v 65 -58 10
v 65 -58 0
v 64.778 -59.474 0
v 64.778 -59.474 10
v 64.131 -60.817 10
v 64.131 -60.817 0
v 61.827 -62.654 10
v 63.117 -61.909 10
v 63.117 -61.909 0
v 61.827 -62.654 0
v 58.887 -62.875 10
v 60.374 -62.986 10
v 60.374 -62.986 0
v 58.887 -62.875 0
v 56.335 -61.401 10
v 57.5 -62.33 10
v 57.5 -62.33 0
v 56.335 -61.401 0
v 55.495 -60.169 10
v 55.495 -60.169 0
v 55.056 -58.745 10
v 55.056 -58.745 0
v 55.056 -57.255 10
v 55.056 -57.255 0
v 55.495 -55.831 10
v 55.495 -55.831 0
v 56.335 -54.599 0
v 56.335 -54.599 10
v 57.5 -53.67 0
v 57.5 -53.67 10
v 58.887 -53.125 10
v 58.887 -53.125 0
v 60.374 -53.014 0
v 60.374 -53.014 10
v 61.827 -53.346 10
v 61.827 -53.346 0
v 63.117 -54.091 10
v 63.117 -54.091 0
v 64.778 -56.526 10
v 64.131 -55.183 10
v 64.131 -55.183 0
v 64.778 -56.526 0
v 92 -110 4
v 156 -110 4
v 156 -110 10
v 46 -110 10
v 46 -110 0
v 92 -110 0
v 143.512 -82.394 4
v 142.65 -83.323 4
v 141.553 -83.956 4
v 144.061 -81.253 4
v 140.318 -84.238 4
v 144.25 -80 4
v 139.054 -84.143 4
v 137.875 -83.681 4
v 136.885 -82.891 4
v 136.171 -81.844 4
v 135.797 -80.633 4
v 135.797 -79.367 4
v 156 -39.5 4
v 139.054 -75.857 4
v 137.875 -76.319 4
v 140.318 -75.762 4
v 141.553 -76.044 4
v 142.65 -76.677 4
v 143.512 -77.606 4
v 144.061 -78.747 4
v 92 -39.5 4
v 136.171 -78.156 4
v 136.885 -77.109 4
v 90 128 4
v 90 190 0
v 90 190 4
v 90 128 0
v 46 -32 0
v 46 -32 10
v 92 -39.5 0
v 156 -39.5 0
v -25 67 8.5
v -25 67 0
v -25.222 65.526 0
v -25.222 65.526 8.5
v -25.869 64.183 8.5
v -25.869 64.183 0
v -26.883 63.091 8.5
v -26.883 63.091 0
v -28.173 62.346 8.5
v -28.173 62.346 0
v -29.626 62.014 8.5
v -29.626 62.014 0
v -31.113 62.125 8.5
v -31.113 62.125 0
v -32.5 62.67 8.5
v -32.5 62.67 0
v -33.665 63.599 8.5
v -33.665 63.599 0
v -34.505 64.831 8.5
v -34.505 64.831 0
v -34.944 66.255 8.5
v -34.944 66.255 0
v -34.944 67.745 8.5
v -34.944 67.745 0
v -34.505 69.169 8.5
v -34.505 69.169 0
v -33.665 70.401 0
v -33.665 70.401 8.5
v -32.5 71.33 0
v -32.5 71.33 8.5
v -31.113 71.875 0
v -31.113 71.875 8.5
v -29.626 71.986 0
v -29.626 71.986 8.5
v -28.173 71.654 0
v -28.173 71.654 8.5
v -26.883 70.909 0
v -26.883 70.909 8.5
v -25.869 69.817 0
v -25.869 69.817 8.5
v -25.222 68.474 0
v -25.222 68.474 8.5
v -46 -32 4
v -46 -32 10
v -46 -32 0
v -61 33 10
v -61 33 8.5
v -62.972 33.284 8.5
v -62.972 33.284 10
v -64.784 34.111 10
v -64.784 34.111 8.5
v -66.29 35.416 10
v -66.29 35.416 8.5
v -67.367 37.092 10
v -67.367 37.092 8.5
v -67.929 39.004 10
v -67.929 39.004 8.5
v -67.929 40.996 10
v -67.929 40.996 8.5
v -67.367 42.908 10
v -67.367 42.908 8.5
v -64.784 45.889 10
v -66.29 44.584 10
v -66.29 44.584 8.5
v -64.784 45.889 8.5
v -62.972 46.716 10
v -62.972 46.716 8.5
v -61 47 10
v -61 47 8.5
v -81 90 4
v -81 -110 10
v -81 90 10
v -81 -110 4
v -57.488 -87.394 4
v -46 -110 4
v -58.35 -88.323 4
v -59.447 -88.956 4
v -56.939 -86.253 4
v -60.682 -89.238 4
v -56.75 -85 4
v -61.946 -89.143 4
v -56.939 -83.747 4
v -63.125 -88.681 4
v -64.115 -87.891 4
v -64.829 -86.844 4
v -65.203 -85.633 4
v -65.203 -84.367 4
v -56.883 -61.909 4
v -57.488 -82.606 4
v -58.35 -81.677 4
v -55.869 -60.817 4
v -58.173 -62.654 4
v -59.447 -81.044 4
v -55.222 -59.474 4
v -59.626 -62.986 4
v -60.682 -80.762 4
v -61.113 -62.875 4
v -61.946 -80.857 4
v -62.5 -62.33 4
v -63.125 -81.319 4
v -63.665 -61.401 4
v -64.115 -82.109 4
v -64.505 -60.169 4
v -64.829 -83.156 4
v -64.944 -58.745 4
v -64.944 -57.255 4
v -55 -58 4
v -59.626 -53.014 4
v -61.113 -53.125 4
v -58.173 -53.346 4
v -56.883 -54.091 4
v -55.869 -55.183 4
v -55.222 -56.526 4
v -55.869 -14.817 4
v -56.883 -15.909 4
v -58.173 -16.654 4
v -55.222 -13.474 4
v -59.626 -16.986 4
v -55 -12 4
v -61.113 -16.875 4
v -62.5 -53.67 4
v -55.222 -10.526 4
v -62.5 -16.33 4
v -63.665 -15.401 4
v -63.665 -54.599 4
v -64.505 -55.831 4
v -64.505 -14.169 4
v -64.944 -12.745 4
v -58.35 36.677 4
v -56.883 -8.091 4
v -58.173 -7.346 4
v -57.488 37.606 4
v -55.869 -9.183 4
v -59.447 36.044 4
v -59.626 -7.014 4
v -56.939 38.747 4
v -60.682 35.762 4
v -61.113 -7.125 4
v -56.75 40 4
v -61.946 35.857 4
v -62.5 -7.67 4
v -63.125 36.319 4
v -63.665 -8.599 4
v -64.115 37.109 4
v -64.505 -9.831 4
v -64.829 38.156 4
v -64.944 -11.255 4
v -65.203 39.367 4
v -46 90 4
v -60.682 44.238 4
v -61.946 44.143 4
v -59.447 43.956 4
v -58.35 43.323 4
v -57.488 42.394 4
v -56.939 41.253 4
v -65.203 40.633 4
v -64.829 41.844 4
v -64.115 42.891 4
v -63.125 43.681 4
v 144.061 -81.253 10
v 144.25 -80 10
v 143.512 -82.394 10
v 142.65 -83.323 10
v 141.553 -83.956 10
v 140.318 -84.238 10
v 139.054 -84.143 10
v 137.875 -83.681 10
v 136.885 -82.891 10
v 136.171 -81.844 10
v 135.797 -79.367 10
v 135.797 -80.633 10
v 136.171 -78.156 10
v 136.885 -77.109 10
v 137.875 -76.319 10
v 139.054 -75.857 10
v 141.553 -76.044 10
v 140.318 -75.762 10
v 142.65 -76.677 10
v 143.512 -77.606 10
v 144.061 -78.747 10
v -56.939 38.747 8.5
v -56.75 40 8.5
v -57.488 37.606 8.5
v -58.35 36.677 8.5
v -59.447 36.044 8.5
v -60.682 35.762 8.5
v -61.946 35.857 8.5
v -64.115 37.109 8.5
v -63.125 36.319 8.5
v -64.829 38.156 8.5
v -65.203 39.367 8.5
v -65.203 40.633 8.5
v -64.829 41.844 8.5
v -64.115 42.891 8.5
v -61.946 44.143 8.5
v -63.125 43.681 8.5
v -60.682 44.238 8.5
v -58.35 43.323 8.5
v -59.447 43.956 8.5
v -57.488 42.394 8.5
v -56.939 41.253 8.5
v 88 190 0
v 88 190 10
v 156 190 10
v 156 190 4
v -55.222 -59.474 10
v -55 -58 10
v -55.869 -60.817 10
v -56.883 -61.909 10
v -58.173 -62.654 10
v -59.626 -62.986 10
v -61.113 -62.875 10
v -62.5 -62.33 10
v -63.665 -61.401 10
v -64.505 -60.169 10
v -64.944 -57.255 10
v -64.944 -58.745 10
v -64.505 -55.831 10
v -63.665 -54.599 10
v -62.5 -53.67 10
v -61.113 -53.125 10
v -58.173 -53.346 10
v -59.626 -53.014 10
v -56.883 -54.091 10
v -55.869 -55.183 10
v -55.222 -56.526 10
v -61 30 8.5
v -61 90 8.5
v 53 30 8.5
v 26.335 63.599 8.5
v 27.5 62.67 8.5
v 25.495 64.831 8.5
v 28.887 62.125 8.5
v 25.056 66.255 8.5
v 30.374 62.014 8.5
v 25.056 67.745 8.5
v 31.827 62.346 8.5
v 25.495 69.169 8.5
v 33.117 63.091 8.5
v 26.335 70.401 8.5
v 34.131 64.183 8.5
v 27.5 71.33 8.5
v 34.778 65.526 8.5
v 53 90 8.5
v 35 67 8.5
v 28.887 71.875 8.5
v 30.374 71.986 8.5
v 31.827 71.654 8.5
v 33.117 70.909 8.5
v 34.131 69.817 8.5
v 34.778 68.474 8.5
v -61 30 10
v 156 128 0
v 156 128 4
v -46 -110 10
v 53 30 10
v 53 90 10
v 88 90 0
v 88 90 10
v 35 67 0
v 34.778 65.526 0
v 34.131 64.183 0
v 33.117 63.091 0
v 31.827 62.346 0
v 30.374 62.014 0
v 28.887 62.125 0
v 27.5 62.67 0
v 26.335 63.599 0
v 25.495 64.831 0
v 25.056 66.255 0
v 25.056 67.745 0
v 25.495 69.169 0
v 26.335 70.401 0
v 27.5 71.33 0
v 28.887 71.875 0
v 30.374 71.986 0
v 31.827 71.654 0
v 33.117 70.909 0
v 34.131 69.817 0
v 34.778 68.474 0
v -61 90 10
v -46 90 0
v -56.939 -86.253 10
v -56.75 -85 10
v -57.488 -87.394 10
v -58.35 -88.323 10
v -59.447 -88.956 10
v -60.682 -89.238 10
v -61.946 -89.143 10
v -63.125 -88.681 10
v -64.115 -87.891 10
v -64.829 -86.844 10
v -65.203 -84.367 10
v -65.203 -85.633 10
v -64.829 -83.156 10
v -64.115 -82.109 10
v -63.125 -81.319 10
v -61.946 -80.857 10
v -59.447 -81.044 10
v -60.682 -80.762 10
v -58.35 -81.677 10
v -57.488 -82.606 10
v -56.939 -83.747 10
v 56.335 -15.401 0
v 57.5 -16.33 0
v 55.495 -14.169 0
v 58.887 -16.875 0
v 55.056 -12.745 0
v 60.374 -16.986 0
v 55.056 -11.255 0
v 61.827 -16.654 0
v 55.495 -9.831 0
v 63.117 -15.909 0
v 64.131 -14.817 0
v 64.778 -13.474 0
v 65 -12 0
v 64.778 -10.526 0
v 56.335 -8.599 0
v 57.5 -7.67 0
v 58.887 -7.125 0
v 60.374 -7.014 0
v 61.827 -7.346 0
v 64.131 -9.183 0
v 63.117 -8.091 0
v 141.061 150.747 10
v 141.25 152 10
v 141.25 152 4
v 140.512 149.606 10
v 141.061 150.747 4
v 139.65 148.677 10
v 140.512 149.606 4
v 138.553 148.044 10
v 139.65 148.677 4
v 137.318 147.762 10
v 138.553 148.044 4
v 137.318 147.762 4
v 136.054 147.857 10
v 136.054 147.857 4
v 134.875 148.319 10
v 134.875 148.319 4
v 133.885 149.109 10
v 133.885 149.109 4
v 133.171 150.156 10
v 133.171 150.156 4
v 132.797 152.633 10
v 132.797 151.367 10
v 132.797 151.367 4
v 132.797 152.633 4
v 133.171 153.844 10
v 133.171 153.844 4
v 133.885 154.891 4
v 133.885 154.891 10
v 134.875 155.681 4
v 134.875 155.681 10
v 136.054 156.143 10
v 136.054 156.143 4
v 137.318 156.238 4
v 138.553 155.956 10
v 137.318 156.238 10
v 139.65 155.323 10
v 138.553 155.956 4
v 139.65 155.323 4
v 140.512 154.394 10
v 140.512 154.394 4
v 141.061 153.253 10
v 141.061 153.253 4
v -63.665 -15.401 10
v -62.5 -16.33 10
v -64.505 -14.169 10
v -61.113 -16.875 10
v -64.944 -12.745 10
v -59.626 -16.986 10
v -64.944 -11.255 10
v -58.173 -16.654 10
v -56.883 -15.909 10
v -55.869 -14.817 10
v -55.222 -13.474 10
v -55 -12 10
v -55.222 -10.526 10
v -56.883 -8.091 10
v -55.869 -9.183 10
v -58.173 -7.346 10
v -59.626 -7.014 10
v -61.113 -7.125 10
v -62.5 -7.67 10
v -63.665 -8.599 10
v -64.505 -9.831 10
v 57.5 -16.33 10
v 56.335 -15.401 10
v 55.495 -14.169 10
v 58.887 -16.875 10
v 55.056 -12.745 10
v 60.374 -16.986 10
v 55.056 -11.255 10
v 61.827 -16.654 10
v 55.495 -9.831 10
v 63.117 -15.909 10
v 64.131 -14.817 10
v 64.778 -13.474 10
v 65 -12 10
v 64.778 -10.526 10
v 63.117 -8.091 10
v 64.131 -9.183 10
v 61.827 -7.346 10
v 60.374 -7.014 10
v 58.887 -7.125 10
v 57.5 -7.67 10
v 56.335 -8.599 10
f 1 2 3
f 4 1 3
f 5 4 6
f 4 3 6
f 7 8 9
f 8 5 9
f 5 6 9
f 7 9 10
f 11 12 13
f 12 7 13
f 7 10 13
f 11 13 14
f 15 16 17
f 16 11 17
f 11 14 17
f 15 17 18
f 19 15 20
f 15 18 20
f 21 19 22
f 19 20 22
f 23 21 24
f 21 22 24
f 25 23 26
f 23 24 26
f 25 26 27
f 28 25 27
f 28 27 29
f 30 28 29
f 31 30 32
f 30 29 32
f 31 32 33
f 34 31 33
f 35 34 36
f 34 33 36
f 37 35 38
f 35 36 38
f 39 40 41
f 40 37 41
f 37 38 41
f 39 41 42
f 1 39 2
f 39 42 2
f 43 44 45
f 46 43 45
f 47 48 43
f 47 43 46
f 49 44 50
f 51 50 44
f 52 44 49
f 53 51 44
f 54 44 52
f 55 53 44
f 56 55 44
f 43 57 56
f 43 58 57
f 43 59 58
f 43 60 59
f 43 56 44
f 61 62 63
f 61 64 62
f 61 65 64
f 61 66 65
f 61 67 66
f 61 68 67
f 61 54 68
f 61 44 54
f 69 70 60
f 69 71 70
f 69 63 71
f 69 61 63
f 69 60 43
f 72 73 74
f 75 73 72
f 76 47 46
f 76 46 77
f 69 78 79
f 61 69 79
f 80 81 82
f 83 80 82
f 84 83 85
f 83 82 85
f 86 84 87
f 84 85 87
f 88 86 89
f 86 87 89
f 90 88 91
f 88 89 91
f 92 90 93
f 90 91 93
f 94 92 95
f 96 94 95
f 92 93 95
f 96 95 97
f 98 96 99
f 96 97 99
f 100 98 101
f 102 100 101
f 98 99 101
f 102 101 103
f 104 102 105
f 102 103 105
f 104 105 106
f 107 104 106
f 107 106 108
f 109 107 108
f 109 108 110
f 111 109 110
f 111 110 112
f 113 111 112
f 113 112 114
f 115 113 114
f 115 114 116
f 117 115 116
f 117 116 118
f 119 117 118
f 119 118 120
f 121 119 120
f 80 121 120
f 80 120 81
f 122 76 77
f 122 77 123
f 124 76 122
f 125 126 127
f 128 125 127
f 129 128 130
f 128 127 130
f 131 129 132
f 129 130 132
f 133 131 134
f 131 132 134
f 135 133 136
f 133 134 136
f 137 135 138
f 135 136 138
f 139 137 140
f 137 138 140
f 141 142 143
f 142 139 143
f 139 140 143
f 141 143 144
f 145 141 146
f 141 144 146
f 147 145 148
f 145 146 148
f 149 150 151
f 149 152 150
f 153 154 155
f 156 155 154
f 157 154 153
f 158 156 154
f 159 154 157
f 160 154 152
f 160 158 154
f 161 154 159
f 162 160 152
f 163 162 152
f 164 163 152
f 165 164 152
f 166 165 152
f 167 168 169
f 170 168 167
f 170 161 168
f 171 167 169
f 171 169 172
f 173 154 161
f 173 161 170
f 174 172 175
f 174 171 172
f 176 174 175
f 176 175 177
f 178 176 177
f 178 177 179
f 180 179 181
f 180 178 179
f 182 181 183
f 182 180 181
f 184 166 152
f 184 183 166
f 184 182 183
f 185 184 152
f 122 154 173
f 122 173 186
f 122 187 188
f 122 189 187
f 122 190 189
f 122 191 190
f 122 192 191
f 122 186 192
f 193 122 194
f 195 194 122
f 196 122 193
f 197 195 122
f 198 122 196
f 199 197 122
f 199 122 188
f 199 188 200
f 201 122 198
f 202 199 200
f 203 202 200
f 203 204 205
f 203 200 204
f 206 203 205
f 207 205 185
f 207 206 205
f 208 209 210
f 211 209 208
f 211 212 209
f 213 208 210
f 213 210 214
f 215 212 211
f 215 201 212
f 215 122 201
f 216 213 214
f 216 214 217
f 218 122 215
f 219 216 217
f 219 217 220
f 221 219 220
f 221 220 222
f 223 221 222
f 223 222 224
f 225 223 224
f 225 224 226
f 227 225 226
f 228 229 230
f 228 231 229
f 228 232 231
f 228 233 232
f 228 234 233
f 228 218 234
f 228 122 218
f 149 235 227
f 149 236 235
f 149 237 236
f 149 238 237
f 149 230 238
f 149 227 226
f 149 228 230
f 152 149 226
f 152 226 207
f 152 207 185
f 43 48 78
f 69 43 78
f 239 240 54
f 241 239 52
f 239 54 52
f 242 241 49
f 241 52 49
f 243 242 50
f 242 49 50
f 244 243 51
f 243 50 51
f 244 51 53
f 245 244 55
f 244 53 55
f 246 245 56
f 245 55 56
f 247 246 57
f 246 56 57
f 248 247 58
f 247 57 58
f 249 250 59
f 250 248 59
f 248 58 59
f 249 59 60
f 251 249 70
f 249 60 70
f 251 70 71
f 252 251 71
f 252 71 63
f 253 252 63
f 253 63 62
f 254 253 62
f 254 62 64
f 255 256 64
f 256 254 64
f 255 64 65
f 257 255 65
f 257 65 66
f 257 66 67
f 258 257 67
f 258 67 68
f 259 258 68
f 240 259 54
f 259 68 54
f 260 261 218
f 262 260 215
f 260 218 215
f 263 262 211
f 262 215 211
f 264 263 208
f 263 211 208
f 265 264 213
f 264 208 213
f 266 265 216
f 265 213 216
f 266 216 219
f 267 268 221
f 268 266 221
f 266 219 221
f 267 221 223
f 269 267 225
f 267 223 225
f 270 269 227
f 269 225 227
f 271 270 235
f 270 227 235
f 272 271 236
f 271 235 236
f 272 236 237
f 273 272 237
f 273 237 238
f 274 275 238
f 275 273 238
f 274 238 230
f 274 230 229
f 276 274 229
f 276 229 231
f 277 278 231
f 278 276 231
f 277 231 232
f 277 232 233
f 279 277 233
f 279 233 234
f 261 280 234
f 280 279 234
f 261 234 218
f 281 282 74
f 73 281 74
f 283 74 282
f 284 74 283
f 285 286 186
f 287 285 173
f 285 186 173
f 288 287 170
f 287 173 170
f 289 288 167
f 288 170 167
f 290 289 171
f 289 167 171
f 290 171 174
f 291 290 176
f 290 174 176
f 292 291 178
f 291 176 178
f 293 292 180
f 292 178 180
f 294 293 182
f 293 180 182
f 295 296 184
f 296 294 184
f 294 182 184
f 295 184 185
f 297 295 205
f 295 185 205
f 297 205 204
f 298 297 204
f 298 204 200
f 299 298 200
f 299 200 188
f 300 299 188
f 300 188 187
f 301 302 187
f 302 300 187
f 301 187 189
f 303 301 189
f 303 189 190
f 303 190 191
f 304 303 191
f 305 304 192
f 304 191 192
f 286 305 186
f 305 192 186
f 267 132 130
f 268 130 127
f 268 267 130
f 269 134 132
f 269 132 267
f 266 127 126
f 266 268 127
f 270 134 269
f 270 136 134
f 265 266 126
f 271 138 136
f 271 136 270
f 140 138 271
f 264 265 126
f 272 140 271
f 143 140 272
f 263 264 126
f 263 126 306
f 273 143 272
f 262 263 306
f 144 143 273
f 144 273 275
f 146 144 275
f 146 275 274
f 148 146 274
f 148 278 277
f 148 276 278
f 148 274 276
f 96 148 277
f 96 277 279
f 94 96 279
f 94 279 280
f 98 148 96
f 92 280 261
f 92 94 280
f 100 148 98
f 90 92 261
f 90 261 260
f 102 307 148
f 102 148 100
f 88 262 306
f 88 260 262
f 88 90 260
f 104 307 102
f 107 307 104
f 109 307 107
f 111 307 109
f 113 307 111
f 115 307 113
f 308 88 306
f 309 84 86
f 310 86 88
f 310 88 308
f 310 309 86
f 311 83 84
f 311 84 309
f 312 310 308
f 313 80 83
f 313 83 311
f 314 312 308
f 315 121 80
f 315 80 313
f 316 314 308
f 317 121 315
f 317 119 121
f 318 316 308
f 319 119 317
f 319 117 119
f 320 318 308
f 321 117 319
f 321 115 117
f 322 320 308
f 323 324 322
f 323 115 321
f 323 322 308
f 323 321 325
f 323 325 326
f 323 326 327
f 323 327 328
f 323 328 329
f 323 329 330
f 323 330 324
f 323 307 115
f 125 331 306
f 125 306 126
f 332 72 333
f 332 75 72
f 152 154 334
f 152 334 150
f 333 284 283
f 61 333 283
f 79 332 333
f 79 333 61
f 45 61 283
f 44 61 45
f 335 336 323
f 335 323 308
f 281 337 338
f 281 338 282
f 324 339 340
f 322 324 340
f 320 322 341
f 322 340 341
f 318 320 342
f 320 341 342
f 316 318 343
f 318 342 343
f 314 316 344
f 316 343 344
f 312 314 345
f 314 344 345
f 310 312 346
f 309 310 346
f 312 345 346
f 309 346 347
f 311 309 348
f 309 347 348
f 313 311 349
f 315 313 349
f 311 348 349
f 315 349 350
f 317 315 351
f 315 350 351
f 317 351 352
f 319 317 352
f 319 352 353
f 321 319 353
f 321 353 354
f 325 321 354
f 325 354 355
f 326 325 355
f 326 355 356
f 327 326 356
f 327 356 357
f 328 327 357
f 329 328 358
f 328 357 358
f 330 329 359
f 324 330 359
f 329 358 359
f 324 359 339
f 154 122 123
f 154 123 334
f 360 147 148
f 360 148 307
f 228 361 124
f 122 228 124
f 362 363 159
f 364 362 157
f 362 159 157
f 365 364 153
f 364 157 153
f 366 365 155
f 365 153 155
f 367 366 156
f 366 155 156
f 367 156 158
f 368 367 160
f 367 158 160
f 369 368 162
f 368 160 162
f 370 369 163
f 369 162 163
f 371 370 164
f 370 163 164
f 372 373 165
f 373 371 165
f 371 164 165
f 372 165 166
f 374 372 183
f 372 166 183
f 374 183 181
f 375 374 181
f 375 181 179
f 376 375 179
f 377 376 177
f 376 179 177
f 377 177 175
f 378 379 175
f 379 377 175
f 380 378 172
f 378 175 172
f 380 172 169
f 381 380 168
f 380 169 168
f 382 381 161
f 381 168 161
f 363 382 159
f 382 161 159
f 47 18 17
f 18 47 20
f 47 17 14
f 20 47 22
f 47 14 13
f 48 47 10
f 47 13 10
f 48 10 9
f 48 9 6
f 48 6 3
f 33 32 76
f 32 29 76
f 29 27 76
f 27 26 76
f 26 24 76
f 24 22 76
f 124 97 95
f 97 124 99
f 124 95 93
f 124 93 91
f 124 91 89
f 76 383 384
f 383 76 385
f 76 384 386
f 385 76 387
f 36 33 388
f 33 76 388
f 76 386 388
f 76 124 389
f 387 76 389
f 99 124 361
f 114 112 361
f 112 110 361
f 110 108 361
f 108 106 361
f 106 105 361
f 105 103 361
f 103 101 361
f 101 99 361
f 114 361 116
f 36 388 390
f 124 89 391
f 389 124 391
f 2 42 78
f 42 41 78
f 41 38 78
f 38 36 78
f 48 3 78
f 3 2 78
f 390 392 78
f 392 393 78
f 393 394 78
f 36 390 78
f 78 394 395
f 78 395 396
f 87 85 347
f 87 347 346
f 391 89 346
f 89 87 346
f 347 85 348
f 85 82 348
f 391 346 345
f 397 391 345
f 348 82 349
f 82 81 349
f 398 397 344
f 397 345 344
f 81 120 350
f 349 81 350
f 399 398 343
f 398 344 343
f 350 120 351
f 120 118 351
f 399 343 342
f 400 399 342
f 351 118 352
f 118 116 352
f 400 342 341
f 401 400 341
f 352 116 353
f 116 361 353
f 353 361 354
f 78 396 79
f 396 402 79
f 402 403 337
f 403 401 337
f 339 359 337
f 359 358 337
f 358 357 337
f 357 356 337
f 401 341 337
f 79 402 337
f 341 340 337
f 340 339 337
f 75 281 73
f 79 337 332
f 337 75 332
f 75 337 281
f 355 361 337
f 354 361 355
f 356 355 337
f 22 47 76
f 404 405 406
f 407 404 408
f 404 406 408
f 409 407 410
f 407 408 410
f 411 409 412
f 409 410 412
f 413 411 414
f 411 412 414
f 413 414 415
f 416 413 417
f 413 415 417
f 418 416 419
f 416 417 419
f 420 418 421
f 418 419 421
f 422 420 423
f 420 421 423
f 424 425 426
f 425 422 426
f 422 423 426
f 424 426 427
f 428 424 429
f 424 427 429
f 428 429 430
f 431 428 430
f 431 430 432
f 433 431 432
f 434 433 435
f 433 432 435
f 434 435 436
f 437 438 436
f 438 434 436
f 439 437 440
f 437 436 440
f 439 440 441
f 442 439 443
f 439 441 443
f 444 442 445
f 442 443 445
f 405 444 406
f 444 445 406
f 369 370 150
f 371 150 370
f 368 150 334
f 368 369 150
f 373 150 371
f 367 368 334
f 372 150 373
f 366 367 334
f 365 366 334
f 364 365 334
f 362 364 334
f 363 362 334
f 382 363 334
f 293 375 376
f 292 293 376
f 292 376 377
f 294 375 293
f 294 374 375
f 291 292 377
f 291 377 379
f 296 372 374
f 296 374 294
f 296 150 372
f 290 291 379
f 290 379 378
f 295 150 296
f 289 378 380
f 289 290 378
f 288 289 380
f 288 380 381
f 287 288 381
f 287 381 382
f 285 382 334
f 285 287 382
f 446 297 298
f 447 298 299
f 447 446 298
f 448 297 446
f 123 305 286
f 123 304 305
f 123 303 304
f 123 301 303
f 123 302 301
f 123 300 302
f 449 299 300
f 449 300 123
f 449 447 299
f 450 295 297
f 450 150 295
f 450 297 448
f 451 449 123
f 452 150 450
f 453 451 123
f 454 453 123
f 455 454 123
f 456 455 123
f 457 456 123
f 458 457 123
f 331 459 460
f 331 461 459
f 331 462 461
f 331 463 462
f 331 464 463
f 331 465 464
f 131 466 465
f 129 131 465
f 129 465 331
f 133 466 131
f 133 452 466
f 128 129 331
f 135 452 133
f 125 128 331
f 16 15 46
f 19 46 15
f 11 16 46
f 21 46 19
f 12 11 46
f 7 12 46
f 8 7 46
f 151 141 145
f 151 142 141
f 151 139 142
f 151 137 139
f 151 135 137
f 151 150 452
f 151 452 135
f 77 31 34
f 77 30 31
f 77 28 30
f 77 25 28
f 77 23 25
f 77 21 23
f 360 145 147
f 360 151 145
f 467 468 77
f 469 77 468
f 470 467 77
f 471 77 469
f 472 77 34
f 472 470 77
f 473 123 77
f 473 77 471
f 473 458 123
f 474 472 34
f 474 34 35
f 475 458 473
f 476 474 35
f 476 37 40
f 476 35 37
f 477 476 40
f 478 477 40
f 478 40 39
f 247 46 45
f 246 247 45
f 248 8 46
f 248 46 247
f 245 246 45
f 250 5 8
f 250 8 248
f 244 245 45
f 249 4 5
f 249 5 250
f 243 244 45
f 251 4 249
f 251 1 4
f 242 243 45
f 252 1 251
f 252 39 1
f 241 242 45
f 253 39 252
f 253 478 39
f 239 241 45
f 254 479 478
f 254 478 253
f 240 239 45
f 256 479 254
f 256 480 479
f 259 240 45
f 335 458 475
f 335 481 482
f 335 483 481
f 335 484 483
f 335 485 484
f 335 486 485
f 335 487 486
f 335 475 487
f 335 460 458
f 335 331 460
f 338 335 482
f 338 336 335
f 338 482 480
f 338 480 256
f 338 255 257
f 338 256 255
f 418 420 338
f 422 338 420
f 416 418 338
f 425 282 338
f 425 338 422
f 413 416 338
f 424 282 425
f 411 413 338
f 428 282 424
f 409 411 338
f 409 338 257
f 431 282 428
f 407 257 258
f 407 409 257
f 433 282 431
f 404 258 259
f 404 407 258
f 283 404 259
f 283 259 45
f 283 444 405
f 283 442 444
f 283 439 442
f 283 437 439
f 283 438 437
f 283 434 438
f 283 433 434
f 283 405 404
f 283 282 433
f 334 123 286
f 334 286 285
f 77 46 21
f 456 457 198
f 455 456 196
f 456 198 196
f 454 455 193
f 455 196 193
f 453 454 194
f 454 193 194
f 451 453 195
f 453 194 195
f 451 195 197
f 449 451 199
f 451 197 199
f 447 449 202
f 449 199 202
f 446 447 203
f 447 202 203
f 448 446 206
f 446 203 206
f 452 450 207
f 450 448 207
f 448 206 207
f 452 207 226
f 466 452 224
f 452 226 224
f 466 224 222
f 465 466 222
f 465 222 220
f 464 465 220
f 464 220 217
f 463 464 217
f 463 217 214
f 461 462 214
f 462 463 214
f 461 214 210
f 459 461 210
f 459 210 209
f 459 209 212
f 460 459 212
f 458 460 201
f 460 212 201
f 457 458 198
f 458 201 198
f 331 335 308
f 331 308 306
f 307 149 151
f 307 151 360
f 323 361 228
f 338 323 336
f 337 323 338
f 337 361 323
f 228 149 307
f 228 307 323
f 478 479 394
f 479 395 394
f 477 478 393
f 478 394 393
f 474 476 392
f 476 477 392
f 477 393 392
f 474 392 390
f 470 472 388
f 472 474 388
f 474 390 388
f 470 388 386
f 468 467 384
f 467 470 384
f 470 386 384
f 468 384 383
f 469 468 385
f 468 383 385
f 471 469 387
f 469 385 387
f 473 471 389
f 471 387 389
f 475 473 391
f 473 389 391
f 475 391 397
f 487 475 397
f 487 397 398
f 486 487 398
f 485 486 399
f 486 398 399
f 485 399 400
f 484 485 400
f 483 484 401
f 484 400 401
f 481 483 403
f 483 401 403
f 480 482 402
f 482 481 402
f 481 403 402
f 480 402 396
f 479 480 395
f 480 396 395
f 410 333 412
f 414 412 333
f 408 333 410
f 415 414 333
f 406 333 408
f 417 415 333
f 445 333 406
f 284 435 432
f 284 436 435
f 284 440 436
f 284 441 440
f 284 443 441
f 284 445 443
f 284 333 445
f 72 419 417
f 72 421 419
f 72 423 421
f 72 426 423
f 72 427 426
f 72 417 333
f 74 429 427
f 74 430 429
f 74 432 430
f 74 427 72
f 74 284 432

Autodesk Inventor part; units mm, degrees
ref_plane "YZ Plane" through (0, 0, 0) normal (1, 0, 0) x (0, 1, 0)
ref_plane "XZ Plane" through (0, 0, 0) normal (0, 1, 0) x (-1, 0, 0)
ref_plane "XY Plane" through (0, 0, 0) normal (0, 0, 1) x (1, 0, 0)
sketch "Sketch1" plane through (0, 0, 0) normal (0, 0, 1) x (1, 0, 0)
  circle A0 centre (60, -12) radius 5
  line L0 (0, 0) -> (0, 90) construction
  circle A1 centre (-60, -12) radius 5
  line L1 (46, -32) -> (-46, -32)
  line L2 (-46, -32) -> (-46, -110)
  line L3 (-46, -110) -> (-81, -110)
  line L4 (-81, 90) -> (88, 90)
  line L5 (88, 90) -> (88, 190)
  line L6 (88, 190) -> (156, 190)
  line L7 (156, 190) -> (156, -110)
  line L8 (156, -110) -> (46, -110)
  line L9 (46, -110) -> (46, -32)
  line L10 (-81, -110) -> (-81, 90)
  circle A2 centre (30, 67) radius 5
  circle A3 centre (-30, 67) radius 5
  circle A4 centre (60, -58) radius 5
  circle A5 centre (-60, -58) radius 5
  circle A6 centre (-61, -85) radius 4.25
  circle A7 centre (140, -80) radius 4.25
  circle A8 centre (137, 152) radius 4.25
  circle A9 centre (-61, 40) radius 4.25
  point P0 (0, -32)
  dimension "d82" = 10
  dimension "d83" = 60
  dimension "d86" = 32
  dimension "d87" = 90
  dimension "d88" = 92
  dimension "d90" = 300
  dimension "d91" = 200
  dimension "d92" = 35
  dimension "d93" = 68
  dimension "d94" = 100
  dimension "d95" = 237
  dimension "d96" = 79
  dimension "d98" = 60
  dimension "d100" = 46
  dimension "d101" = 8.5
  dimension "d102" = 140
  dimension "d103" = 80
  dimension "d104" = 3
  dimension "d105" = 152
  dimension "d106" = 61
  dimension "d107" = 85
  dimension "d108" = 40
  dimension "d136" = 12
extrude "Extrusion1" add sketch "Sketch1" along normal blind 10
sketch "Sketch2" plane through (0, 0, 10) normal (0, 0, 1) x (1, 0, 0)
  line L0 (-81, 90) -> (88, 90) projected
  line L1 (-61, 90) -> (53, 90)
  line L2 (53, 90) -> (53, 30)
  line L3 (53, 30) -> (-61, 30)
  line L4 (-61, 30) -> (-61, 90)
  line L5 (-81, 90) -> (-81, -110) projected
  point P0 (0, 0)
  dimension "d111" = 114
  dimension "d112" = 60
  dimension "d113" = 20
extrude "Extrusion2" cut sketch "Sketch2" against normal blind 1.5
sketch "Sketch3" plane through (0, 0, 8.5) normal (0, 0, 1) x (1, 0, 0)
  circle A0 centre (-61, 40) radius 4.25 projected
  circle A1 centre (-61, 40) radius 7
  point P0 (0, 0)
  dimension "d116" = 14
extrude "Extrusion3" cut sketch "Sketch3" along normal up to surface (1.5 mm away)
thread "Thread1" size "M10x1.5" class "6H" standard "ISO Metric profile" full length
thread "Thread2" size "M10x1.5" class "6H" standard "ANSI Metric M Profile" full length
thread "Thread3" size "M10x1.5" class "6H" standard "ANSI Metric M Profile" full length
thread "Thread4" size "M10x1.5" class "6H" standard "ANSI Metric M Profile" full length
sketch "Sketch4" plane through (0, 0, 0) normal (0, 0, -1) x (-1, 0, 0)
  line L0 (-156, 190) -> (-156, -110) projected
  line L1 (-156, 190) -> (-90, 190)
  line L2 (-88, 190) -> (-156, 190) projected
  line L3 (-90, 190) -> (-90, 128)
  line L4 (-88, 90) -> (-88, 190) projected
  line L5 (-90, 190) -> (-28, 190) construction
  line L6 (-90, 128) -> (-156, 128)
  line L7 (-156, 128) -> (-156, 190)
  line L8 (-156, -110) -> (-46, -110) projected
  line L9 (-156, -110) -> (-92, -110)
  line L10 (-92, -110) -> (-92, -39.5)
  line L11 (-92, -39.5) -> (-156, -39.5)
  line L12 (81, -110) -> (81, 90) projected
  line L13 (46, -32) -> (46, -110) projected
  line L14 (81, -110) -> (46, -110)
  line L15 (46, -110) -> (46, 90)
  line L16 (81, 90) -> (-88, 90) projected
  point P0 (0, 0)
  dimension "d127" = 66
  dimension "d128" = 62
  dimension "d129" = 90
  dimension "d130" = 66
  dimension "d131" = 90
  dimension "d134" = 64
  dimension "d135" = 70.5
extrude "Extrusion4" cut sketch "Sketch4" against normal blind 4
properties part number "SUPPORT MAIN FRAME MOTOR-BALL SCREW-REV-B" material "Steel"
